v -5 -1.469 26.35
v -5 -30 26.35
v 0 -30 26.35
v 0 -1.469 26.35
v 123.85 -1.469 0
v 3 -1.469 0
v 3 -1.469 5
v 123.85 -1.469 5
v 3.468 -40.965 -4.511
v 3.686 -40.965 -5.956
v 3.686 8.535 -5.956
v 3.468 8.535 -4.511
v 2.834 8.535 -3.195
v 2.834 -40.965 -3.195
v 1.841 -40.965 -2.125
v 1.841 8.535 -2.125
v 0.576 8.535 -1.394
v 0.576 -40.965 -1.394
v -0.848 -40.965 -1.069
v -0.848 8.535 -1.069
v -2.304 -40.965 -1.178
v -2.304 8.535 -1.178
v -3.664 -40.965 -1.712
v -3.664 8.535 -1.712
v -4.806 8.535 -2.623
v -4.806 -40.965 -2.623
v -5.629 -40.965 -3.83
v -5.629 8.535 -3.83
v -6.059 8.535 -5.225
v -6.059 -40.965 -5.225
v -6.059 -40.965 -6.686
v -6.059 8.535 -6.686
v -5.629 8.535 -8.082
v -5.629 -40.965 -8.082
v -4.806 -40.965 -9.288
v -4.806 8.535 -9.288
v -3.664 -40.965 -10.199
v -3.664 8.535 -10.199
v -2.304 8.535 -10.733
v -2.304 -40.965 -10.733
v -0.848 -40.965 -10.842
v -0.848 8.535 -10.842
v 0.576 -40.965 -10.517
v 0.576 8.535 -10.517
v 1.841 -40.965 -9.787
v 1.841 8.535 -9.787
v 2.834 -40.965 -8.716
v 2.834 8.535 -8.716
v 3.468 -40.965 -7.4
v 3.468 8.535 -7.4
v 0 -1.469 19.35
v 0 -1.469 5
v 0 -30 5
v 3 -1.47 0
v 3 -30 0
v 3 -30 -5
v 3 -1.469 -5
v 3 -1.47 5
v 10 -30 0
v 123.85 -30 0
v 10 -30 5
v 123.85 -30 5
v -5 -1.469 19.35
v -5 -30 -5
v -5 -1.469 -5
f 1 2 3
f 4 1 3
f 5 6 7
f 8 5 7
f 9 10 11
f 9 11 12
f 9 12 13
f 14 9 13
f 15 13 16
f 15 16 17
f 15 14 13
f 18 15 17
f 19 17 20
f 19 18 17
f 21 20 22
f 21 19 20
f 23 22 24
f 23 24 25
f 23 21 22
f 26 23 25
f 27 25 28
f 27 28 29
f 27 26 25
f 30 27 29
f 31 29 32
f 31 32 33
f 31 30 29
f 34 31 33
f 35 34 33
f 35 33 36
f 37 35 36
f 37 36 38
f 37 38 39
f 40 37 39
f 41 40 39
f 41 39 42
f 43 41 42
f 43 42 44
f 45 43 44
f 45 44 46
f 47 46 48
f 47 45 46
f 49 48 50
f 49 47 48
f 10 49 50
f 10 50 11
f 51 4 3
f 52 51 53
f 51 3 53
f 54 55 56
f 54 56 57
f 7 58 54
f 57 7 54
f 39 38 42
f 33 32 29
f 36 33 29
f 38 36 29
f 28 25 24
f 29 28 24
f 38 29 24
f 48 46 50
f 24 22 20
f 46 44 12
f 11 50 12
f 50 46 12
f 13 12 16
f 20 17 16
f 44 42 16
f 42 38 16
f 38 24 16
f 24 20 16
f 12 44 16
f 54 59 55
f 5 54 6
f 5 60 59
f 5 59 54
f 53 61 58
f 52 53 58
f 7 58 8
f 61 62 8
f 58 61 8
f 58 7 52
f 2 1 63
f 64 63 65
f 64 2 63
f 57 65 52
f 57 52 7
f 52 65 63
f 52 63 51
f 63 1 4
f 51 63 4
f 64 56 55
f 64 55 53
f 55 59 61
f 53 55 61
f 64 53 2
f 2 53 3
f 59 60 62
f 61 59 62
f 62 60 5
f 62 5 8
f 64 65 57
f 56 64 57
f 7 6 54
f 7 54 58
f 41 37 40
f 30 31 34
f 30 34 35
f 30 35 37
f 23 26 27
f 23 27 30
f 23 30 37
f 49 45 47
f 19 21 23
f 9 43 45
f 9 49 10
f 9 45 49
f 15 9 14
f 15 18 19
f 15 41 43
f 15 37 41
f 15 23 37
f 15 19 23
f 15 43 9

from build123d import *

# Parameters (mm, degrees)
SKETCH1_W                = 10
SKETCH1_H                = 28.53
BOSS_EXTRUDE1_DEPTH      = 5
SKETCH2_R                = 1.6
CUT_EXTRUDE2_DEPTH       = 43
SKETCH4_W                = 8
SKETCH4_H                = 28.530522497
BOSS_EXTRUDE2_DEPTH      = 5
BOSS_EXTRUDE2_DEPTH_BACK = 5
BOSS_EXTRUDE4_START      = -53
SKETCH6_W                = 5
SKETCH6_H                = 28.530522497
BOSS_EXTRUDE4_DEPTH      = 120.849702
SKETCH7_W                = 5
SKETCH7_H                = 28.530522497
BOSS_EXTRUDE5_DEPTH      = 26.35
SKETCH8_W                = 5
SKETCH8_H                = 7
BOSS_EXTRUDE6_DEPTH      = 21.504288
SKETCH9_W                = 5
SKETCH9_H                = 21.35
CUT_EXTRUDE3_DEPTH       = 22.504288
SKETCH10_R               = 4.9
BOSS_EXTRUDE7_DEPTH      = 49.5


with BuildPart() as part:
    # Sketch1 → Boss-Extrude1 (new body)
    with BuildSketch(Plane.XY):
        with Locations((5, -15.735)):
            Rectangle(SKETCH1_W, SKETCH1_H)
    extrude(amount=BOSS_EXTRUDE1_DEPTH)

    # Sketch2 → Cut-Extrude2 (cut)
    with BuildSketch(Plane(origin=(0, 0, 0), x_dir=(-1, 0, 0), z_dir=(0, 0, -1))):
        with Locations((-6.810310374, -9.47)):
            Circle(SKETCH2_R)
        with Locations((-6.810310374, -22)):
            Circle(SKETCH2_R)
    extrude(amount=-CUT_EXTRUDE2_DEPTH, mode=Mode.SUBTRACT)

    # Sketch4 → Boss-Extrude2 (add, two sides)
    with BuildSketch(Plane.XY) as boss_extrude2_sk:
        with Locations((-1, -15.734738752)):
            Rectangle(SKETCH4_W, SKETCH4_H)
    extrude(amount=BOSS_EXTRUDE2_DEPTH)
    extrude(boss_extrude2_sk.sketch, amount=-BOSS_EXTRUDE2_DEPTH_BACK)

    # Sketch6 → Boss-Extrude4 (add)
    with BuildSketch(Plane.ZY.offset(-70.84970239).offset(BOSS_EXTRUDE4_START)):
        with Locations((2.5, -15.734738752)):
            Rectangle(SKETCH6_W, SKETCH6_H)
    extrude(amount=BOSS_EXTRUDE4_DEPTH)

    # Sketch7 → Boss-Extrude5 (add)
    with BuildSketch(Plane(origin=(0, 0, 0), x_dir=(-1, 0, 0), z_dir=(0, 0, -1))):
        with Locations((2.5, -15.734738752)):
            Rectangle(SKETCH7_W, SKETCH7_H)
    extrude(amount=-BOSS_EXTRUDE5_DEPTH)

    # Sketch8 → Boss-Extrude6 (add)
    with BuildSketch(Plane(origin=(0, -1.469477503, 0), x_dir=(1, 0, 0), z_dir=(0, 1, 0))):
        with Locations((-2.5, -22.85)):
            Rectangle(SKETCH8_W, SKETCH8_H)
    extrude(amount=BOSS_EXTRUDE6_DEPTH)

    # Sketch9 → Cut-Extrude3 (cut, through all)
    with BuildSketch(Plane.XZ.offset(1.469477503)):
        with Locations((-2.5, 15.675)):
            Rectangle(SKETCH9_W, SKETCH9_H)
    extrude(amount=-CUT_EXTRUDE3_DEPTH, mode=Mode.SUBTRACT)


with BuildPart() as body_2:
    # Sketch10 → Boss-Extrude7 (new body)
    with BuildSketch(Plane.XZ.offset(40.965189842)):
        with Locations((-1.214108885, -5.955533219)):
            Circle(SKETCH10_R)
    extrude(amount=-BOSS_EXTRUDE7_DEPTH)


solid = Compound([part.part, body_2.part])
